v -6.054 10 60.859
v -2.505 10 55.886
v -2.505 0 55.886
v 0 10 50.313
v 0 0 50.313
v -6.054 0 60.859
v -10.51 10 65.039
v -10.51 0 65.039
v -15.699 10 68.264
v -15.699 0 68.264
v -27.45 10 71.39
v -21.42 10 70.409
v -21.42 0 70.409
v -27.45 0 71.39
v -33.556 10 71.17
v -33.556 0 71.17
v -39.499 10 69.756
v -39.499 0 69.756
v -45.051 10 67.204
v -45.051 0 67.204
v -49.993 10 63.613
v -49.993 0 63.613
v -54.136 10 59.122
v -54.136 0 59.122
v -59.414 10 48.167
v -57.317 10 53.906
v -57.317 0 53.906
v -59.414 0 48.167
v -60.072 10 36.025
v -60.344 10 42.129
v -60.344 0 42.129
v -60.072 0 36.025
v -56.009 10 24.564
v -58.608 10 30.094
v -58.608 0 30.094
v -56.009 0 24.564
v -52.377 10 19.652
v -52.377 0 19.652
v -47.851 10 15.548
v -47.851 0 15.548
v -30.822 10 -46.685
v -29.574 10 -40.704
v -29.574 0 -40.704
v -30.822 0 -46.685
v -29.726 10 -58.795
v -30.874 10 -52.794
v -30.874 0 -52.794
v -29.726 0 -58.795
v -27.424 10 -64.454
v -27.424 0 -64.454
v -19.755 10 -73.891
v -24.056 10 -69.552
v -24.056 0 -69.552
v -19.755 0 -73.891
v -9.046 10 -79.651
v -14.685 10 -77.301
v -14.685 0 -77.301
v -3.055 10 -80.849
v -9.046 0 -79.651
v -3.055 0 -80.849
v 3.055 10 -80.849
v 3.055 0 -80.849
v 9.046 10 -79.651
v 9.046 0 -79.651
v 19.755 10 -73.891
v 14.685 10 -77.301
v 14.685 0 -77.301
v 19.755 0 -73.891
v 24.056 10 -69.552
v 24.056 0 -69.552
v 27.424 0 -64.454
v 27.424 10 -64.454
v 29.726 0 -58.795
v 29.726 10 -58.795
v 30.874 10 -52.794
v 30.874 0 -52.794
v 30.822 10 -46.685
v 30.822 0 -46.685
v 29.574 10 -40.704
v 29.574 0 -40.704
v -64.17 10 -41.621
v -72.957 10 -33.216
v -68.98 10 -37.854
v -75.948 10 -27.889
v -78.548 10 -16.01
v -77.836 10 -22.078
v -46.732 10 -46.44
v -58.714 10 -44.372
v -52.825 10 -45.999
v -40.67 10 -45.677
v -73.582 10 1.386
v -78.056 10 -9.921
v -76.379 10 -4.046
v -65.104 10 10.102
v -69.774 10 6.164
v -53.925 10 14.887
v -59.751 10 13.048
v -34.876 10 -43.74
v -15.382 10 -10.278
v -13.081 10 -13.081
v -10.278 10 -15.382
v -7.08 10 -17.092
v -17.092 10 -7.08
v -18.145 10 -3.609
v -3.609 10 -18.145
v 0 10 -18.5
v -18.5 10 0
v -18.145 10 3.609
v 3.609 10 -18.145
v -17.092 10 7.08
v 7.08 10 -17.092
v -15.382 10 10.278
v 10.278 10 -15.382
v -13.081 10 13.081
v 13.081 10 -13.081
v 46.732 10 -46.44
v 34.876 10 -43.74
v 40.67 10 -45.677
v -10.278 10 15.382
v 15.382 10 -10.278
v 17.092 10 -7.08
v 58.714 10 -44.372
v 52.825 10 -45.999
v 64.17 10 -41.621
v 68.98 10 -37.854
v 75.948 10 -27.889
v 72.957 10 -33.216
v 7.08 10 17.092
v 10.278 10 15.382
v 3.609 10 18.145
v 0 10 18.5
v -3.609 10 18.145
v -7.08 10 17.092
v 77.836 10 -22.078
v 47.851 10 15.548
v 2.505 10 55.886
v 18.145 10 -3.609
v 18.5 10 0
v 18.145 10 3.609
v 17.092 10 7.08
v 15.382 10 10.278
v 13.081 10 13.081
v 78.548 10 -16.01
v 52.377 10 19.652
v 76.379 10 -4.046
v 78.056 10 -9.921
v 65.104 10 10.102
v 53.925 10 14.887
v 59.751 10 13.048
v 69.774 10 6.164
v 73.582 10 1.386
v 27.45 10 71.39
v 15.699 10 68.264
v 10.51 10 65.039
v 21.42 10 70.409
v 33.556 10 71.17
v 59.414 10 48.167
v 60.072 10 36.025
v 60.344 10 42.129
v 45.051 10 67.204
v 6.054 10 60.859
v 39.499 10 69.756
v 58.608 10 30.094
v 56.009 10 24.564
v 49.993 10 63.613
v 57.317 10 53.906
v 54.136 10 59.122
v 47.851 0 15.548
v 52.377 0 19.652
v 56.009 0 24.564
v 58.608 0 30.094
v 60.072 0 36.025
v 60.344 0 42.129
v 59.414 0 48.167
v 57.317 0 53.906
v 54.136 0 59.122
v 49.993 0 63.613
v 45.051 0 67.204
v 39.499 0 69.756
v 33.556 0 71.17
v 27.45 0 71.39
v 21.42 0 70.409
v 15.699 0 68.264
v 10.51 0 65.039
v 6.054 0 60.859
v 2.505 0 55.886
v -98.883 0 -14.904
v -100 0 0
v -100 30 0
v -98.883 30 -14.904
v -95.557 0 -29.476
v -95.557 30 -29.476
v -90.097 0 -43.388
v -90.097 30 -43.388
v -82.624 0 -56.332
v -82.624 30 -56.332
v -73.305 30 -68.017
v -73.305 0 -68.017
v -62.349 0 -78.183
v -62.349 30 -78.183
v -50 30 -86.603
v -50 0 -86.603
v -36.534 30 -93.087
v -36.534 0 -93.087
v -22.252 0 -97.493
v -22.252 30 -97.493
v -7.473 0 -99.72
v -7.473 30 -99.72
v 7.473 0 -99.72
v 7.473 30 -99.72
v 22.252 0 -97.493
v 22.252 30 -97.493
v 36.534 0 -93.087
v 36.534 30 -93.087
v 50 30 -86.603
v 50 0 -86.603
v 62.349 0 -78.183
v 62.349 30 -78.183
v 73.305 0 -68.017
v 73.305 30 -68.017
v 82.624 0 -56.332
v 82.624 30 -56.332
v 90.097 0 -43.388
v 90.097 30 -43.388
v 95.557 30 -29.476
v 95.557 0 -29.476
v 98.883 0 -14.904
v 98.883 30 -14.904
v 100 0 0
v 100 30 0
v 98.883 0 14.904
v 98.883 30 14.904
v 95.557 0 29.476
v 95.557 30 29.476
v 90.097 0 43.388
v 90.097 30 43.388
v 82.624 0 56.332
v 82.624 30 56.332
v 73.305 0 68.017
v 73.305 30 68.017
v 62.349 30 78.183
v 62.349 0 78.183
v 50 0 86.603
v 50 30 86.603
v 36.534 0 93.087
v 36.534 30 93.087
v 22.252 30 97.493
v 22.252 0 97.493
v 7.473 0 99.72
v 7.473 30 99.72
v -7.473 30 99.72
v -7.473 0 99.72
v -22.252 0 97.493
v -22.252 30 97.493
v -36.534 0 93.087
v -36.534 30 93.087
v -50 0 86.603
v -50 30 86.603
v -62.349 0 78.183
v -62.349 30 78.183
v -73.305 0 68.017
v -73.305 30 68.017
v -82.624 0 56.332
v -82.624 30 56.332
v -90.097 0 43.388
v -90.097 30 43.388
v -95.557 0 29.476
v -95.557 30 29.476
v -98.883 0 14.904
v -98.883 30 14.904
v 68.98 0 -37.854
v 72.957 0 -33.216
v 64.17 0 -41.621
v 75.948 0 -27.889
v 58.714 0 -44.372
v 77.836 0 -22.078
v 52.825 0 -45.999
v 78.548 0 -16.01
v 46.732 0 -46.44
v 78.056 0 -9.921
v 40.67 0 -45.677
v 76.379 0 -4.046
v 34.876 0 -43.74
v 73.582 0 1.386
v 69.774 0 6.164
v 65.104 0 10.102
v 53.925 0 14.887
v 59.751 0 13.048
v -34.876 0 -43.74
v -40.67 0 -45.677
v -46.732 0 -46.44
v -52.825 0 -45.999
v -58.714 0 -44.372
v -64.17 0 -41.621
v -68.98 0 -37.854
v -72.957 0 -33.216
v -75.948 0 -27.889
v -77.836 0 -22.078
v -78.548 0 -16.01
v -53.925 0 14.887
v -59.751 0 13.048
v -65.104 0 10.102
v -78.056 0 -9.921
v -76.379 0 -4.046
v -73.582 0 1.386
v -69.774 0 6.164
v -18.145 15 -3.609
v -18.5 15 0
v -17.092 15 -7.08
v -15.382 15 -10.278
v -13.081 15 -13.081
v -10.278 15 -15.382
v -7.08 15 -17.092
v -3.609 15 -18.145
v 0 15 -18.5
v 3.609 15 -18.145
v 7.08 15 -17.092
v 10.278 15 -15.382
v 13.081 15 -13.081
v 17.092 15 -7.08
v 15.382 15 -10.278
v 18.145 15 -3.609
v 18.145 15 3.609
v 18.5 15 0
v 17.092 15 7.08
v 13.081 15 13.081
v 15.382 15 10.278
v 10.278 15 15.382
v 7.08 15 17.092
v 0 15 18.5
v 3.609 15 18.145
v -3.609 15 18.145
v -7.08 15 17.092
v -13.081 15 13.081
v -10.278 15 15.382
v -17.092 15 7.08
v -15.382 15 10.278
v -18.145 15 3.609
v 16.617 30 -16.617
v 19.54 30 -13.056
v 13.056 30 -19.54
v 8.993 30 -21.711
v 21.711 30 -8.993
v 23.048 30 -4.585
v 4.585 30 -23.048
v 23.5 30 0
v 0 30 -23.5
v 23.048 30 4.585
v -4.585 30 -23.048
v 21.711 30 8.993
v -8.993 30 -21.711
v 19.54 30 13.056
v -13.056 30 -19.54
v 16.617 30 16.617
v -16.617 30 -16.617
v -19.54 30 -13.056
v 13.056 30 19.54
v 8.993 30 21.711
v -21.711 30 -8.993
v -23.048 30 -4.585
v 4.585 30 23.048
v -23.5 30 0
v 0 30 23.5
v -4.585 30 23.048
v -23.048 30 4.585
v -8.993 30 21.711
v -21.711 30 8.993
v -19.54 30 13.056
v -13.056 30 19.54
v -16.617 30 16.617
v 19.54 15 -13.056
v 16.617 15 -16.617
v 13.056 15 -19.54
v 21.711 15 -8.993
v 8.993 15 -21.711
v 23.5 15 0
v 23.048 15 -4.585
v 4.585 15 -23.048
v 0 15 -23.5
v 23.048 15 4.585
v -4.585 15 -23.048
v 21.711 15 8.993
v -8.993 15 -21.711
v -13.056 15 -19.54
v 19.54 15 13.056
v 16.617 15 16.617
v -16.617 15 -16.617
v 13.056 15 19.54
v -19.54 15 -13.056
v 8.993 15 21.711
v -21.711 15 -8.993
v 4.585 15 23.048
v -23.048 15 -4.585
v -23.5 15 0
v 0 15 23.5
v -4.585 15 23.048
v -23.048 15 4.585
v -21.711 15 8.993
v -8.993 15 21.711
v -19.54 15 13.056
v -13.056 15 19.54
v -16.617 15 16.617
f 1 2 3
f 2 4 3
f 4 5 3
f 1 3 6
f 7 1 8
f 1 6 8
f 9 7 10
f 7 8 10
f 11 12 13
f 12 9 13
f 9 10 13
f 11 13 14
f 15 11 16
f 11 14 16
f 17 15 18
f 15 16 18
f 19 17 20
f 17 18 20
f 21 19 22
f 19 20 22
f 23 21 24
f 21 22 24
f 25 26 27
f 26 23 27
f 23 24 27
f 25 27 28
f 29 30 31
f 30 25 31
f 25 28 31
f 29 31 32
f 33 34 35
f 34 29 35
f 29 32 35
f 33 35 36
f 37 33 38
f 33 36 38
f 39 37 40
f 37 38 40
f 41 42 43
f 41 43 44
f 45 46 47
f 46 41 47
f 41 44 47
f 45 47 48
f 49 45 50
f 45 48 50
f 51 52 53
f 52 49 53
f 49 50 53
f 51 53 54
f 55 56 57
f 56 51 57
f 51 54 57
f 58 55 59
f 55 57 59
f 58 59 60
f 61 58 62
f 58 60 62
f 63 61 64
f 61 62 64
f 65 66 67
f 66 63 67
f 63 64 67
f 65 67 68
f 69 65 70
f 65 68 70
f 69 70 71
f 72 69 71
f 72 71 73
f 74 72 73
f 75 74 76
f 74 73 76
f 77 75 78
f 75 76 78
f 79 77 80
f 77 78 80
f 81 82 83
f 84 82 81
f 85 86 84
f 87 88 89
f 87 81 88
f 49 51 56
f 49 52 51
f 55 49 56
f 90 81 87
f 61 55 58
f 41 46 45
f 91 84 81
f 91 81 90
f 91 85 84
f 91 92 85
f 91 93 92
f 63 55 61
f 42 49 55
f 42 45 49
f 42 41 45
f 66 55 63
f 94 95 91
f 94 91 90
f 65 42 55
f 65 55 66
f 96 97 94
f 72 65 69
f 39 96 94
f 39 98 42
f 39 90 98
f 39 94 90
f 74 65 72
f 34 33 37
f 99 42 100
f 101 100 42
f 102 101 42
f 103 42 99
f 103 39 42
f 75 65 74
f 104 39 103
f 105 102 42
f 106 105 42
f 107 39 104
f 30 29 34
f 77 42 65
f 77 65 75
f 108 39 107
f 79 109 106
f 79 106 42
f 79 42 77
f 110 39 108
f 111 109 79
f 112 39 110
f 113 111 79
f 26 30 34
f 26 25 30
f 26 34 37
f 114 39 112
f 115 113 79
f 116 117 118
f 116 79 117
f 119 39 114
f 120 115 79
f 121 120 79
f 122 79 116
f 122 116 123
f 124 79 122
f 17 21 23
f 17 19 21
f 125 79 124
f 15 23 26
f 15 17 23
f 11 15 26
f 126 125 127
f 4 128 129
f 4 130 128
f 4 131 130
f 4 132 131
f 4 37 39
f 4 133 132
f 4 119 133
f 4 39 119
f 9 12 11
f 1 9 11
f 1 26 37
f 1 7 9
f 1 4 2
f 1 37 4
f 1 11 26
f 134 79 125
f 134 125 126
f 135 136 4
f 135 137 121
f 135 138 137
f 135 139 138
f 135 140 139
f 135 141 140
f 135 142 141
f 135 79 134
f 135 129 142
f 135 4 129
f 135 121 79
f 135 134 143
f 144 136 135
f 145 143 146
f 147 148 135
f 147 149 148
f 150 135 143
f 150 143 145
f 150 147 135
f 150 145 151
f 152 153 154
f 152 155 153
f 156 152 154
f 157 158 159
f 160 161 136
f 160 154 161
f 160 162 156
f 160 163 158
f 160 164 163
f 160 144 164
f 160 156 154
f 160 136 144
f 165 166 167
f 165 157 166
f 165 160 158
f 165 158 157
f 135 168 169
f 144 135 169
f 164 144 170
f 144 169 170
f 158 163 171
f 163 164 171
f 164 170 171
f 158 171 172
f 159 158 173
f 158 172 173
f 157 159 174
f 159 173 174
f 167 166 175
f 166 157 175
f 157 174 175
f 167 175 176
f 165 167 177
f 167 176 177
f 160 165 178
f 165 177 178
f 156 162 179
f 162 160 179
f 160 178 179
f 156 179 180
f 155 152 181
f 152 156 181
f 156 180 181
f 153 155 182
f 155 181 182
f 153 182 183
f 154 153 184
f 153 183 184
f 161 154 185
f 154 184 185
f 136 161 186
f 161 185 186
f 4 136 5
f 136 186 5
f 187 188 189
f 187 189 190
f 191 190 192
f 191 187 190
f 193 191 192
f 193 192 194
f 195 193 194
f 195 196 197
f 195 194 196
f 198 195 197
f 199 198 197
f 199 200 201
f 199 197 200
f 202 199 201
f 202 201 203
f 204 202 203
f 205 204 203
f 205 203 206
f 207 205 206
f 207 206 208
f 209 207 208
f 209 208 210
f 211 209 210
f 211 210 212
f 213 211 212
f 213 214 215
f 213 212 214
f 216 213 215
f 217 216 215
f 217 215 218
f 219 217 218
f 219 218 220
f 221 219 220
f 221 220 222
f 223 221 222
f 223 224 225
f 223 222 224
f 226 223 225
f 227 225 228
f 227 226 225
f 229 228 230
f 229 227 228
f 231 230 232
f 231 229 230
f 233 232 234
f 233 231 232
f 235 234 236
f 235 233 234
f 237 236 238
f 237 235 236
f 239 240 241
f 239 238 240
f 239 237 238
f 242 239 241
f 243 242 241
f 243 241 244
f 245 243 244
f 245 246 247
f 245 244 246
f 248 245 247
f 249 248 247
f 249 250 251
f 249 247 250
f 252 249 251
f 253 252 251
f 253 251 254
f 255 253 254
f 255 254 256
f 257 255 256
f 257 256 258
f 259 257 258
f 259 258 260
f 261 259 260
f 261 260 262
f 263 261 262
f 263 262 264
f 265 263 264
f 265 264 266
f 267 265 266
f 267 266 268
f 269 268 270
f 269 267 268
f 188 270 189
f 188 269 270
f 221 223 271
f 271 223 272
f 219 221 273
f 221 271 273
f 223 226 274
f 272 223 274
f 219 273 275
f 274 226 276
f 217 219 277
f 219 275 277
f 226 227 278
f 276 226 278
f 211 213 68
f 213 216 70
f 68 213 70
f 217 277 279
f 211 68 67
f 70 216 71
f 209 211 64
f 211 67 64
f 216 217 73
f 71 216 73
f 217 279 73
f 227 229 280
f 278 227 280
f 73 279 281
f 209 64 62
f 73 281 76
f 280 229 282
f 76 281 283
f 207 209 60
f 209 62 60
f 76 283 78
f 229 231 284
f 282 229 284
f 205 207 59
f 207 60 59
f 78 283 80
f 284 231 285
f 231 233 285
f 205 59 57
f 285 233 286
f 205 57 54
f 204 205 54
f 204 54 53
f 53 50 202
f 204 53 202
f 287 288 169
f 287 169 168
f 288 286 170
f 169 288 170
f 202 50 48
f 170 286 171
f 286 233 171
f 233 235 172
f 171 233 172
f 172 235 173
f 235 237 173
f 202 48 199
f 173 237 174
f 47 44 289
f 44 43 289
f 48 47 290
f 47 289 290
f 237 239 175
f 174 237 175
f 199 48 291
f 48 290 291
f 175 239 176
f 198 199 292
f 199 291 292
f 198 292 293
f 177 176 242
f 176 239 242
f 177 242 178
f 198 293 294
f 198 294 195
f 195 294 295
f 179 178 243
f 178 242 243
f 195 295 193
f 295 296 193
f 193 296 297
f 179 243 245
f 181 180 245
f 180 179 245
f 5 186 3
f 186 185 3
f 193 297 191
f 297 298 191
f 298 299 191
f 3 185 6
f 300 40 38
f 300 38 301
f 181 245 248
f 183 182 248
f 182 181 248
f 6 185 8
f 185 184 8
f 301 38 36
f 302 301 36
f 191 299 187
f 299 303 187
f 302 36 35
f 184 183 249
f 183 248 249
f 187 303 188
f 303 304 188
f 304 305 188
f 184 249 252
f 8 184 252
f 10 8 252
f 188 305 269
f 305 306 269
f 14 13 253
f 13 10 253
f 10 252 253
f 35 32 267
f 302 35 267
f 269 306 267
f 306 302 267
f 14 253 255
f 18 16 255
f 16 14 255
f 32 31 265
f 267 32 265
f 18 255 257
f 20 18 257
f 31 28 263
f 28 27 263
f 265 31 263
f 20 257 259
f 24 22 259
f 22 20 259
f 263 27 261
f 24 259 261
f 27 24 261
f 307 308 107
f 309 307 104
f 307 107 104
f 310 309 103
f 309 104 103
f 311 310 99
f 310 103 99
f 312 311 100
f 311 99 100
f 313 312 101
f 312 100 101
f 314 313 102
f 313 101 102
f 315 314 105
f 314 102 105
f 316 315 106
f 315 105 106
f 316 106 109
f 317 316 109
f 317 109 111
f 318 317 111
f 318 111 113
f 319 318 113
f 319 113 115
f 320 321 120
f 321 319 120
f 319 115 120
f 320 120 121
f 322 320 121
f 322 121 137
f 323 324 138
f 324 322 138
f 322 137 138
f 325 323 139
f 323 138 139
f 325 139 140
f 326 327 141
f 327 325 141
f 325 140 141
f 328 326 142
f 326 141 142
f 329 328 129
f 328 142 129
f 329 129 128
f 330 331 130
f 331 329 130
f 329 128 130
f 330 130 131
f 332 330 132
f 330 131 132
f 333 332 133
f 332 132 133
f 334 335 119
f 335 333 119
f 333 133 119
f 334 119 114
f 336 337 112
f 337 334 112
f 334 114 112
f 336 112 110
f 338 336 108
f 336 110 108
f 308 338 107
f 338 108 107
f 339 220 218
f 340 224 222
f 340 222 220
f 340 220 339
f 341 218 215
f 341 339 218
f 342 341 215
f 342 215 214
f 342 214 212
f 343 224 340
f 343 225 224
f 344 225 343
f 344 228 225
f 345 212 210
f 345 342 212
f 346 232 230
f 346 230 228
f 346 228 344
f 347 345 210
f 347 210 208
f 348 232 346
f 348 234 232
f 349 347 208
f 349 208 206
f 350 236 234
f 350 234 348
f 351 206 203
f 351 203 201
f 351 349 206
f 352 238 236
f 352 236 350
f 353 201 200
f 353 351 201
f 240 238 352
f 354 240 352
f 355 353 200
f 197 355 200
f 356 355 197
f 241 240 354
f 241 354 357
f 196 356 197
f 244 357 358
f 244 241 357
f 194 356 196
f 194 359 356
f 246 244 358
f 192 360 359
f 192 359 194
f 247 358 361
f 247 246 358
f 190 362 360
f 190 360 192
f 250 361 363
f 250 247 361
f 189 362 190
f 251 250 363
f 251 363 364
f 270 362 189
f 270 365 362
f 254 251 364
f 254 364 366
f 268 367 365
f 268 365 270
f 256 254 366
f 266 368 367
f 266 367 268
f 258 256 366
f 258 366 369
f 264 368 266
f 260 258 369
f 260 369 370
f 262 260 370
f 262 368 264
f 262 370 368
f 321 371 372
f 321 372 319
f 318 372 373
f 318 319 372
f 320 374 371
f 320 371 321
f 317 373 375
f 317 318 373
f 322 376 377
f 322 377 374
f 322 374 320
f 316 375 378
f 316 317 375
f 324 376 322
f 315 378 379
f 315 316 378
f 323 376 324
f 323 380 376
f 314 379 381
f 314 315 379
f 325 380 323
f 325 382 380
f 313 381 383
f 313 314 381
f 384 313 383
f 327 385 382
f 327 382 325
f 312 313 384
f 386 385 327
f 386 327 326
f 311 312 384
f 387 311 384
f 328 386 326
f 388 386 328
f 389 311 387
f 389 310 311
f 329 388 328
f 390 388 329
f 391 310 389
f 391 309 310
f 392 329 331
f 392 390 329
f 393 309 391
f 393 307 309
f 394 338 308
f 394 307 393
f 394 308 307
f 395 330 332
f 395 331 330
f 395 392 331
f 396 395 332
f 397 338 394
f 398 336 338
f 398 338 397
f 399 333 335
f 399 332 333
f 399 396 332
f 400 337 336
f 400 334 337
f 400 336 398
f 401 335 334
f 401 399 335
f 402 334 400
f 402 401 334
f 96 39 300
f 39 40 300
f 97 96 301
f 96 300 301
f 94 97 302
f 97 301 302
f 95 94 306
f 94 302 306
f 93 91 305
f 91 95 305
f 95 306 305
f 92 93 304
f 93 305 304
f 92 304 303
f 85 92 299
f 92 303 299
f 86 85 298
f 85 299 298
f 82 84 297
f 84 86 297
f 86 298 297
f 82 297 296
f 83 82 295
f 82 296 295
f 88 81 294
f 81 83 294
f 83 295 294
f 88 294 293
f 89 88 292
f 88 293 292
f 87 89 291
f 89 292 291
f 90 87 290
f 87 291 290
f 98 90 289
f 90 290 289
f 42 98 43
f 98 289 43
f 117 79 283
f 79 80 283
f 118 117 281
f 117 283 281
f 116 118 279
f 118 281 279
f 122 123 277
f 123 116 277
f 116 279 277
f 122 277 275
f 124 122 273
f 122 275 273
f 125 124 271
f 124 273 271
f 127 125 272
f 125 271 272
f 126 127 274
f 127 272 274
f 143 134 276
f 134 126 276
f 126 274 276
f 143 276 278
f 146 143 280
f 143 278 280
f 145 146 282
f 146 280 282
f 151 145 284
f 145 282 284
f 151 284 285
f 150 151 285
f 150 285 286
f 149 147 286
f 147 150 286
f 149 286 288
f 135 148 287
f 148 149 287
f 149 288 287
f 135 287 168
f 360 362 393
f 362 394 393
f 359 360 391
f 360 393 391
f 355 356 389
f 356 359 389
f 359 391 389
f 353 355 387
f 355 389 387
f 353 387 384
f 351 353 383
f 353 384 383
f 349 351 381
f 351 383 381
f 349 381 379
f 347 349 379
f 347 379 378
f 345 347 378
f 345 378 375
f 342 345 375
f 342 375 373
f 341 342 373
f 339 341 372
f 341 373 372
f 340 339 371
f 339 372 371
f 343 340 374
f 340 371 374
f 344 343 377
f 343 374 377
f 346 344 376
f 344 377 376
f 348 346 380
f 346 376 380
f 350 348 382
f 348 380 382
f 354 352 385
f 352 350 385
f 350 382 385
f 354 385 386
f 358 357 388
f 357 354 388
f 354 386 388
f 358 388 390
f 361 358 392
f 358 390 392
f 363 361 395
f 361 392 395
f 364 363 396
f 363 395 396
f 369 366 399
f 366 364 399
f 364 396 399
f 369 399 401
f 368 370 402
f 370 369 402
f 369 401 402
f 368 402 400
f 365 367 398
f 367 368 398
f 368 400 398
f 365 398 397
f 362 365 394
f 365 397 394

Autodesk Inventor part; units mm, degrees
ref_plane "YZ Plane" through (0, 0, 0) normal (1, 0, 0) x (0, 1, 0)
ref_plane "XZ Plane" through (0, 0, 0) normal (0, 1, 0) x (-1, 0, 0)
ref_plane "XY Plane" through (0, 0, 0) normal (0, 0, 1) x (1, 0, 0)
sketch "Sketch1" plane through (0, 0, 0) normal (0, 1, 0) x (-1, 0, 0)
  circle A0 centre (0, 0) radius 10 construction
  circle A1 centre (0, 0) radius 23.5
  circle A2 centre (0, 0) radius 100
  circle A3 centre (0, 0) radius 18.5
  dimension "d0" = 20
  dimension "d1" = 47
  dimension "d2" = 200
  dimension "d3" = 37
extrude "Extrusion1" add sketch "Sketch1" along normal blind 30 contours A2
extrude "Extrusion2" add sketch "Sketch1" along normal blind 15 contours A1
sketch "Sketch2" plane through (0, 0, 0) normal (0, -1, 0) x (1, 0, 0)
  circle A0 centre (0, 0) radius 25 construction
  circle A1 centre (0, -50) radius 25 construction
  circle A2 centre (0, 0) radius 31
  circle A3 centre (0, -50) radius 31
  dimension "dp" = 50
  dimension "d9" = 50
  dimension "d10" = 62
  dimension "d11" = 62
extrude "Extrusion3" cut sketch "Sketch2" against normal blind 10 contours A2 A3 | A3 A2 picked at (0.2237, 14.1835) picked at (-2.1631, -26.7711)
extrude "Extrusion4" cut sketch "Sketch2" against normal blind 10 contours A3 A2 | A2 A3 picked at (-2.1631, -26.7711) picked at (0.2237, -64.1835)
pattern_circular "Circular Pattern1" count 5 over 360 about axis through (0, 0, 0) along (0, 1, 0) of "Extrusion4"
equation "\"d9\" = dp"
equation "\"d11\" = d10"
equation "\"d14\" = d12"
equation "\"modul\" = 2"
equation "\"d12\" = 10"
properties part number "TERMINAL-GEAR-BASE"
